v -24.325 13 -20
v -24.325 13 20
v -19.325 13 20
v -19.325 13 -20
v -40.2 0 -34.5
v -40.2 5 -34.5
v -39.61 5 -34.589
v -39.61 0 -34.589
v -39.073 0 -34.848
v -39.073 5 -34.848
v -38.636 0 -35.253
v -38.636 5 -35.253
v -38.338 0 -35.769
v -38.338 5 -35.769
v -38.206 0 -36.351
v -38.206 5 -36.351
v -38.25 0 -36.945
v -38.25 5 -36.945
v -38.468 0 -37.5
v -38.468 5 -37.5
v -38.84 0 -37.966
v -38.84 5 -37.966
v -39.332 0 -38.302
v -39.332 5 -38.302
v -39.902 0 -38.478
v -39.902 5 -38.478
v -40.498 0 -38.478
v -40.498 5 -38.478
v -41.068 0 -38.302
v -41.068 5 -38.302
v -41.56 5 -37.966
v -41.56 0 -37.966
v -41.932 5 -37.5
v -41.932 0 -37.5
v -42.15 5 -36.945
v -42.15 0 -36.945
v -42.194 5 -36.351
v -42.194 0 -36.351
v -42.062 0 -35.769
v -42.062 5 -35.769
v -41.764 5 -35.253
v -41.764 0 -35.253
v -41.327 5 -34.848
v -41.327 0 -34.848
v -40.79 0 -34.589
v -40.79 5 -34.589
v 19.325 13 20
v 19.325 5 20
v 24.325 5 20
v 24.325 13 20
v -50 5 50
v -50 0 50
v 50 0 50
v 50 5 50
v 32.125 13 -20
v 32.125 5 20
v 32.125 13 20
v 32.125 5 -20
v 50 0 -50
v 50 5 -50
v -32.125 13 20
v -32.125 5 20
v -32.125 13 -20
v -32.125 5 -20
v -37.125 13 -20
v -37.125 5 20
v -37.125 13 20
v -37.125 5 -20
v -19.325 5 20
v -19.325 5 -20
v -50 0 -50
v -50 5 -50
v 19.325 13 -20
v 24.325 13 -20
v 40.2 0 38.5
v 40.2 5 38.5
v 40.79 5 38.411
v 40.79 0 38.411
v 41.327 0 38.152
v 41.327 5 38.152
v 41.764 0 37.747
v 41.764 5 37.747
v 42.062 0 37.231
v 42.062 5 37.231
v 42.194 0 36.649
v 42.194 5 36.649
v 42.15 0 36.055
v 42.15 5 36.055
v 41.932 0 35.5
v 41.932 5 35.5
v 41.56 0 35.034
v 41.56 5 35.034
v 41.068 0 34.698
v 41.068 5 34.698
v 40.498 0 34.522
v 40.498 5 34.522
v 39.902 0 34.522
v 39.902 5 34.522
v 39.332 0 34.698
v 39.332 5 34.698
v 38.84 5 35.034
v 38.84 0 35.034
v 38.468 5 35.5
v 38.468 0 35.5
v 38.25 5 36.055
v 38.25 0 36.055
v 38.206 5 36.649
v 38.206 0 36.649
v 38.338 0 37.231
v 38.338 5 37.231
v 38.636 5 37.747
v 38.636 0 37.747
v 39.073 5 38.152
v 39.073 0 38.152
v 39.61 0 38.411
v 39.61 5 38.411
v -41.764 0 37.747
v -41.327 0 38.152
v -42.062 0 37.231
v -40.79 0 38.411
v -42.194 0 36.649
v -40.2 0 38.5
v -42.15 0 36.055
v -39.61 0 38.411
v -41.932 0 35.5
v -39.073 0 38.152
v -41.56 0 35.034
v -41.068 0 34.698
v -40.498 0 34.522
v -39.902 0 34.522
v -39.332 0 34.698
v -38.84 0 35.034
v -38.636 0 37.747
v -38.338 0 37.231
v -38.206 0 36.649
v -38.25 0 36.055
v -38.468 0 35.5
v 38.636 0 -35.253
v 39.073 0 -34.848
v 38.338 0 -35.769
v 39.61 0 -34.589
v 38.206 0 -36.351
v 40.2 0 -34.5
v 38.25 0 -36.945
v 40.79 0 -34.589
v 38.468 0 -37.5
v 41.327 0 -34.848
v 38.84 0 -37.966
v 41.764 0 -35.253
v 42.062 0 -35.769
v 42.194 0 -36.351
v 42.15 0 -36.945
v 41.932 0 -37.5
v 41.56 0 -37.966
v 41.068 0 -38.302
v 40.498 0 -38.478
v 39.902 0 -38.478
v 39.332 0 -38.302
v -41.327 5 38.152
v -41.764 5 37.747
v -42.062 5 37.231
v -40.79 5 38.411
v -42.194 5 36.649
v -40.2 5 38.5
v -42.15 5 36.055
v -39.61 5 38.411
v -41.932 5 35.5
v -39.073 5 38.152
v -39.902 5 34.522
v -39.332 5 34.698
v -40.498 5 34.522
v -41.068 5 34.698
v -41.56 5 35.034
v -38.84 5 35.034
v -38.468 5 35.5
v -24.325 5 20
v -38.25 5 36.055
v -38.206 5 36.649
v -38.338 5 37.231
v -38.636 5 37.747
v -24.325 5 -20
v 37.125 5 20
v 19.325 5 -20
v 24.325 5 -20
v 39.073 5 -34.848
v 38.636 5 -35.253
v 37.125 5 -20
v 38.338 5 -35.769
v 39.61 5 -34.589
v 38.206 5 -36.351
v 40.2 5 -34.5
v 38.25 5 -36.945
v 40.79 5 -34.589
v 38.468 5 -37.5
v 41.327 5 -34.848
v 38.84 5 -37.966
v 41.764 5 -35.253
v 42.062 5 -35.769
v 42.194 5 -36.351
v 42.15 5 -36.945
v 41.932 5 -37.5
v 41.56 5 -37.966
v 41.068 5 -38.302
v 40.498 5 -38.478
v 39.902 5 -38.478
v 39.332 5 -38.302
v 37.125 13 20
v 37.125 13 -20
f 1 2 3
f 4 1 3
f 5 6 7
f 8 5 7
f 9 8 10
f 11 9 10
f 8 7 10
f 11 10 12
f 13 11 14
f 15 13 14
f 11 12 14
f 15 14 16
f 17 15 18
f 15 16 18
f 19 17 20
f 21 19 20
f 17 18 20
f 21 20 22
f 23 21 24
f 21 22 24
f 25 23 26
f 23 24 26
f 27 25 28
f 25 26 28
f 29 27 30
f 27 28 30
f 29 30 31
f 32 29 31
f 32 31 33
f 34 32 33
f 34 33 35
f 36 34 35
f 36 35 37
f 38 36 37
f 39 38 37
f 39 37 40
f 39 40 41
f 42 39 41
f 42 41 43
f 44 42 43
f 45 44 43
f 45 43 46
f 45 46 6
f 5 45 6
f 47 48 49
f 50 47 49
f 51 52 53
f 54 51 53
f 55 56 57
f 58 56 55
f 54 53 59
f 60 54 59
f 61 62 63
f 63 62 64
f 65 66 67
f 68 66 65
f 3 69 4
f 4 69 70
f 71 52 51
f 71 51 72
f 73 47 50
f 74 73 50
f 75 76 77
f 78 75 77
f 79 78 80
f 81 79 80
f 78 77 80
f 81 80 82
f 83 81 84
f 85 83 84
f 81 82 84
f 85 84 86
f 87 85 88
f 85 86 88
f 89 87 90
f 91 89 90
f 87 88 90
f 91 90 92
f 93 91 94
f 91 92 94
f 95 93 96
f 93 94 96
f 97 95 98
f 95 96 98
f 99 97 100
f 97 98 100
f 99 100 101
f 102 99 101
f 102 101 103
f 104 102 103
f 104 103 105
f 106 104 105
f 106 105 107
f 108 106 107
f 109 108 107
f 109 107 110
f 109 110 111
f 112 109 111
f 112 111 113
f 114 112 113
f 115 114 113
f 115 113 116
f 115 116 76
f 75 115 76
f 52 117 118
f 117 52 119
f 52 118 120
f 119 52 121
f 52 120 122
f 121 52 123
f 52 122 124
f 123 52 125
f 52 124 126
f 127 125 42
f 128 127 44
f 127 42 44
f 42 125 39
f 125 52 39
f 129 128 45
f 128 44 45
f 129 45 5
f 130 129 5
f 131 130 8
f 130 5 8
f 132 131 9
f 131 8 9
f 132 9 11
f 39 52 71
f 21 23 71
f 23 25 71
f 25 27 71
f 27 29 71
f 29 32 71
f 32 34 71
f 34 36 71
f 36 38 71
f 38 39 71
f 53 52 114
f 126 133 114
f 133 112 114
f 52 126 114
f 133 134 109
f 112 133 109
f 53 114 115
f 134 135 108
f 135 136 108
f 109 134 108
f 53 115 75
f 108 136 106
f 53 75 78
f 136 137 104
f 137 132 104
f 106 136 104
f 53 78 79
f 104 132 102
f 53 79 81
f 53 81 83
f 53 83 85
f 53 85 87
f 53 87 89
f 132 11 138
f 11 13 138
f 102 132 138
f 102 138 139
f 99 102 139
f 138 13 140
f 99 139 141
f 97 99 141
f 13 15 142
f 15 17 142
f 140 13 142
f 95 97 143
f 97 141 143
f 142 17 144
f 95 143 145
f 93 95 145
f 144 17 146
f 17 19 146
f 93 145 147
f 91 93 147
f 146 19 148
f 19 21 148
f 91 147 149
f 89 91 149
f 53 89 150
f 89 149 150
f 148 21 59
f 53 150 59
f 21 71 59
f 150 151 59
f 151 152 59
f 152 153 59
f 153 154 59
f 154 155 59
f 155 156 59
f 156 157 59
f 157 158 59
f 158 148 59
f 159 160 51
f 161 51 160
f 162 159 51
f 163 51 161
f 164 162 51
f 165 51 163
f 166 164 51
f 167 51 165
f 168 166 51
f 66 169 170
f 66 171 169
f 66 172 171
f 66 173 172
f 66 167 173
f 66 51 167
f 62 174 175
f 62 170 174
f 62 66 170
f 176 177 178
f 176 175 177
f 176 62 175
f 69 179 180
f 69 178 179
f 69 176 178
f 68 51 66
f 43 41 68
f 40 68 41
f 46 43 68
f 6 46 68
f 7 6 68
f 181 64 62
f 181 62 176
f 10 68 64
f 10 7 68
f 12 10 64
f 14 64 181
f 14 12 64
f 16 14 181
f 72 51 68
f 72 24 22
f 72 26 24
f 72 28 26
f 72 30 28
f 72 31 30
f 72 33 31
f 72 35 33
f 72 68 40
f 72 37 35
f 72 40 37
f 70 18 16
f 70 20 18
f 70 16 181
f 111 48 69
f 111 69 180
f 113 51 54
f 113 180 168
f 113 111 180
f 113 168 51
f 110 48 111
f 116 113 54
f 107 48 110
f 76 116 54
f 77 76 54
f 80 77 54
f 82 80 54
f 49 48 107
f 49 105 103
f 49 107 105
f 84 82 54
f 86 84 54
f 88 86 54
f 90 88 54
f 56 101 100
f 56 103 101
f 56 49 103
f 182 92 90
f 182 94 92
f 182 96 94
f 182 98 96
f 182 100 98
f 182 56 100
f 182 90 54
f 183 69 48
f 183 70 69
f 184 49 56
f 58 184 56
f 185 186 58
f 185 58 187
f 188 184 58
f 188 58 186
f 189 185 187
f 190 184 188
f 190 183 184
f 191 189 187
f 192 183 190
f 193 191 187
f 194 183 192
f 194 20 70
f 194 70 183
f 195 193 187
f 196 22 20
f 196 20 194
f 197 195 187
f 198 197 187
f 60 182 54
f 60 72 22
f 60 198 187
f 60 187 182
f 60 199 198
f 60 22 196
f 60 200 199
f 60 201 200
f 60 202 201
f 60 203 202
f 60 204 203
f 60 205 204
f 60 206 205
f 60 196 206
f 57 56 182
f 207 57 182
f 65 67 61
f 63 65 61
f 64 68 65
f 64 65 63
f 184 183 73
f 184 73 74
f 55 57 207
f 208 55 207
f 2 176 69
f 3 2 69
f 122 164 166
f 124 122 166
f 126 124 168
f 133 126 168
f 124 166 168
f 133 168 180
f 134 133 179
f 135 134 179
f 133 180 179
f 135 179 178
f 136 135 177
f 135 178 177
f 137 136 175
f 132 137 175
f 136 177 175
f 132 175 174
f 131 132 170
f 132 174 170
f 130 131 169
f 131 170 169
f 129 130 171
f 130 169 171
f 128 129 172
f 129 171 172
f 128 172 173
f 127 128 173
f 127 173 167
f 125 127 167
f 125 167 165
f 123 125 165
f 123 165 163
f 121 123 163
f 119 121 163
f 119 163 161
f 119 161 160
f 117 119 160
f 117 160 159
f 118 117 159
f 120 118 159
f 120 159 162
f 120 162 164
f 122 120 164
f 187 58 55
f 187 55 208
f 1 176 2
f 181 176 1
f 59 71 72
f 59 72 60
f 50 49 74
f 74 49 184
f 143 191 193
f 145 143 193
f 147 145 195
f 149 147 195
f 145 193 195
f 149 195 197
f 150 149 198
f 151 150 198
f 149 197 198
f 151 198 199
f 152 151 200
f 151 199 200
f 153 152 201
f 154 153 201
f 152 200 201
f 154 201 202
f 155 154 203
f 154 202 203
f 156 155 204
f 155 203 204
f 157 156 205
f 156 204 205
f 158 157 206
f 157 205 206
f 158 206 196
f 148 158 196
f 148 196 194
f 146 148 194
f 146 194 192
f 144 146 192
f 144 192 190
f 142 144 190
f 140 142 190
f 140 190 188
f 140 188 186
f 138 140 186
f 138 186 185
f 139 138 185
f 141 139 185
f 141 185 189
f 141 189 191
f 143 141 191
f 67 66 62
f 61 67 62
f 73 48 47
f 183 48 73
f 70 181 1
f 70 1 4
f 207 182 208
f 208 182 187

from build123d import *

# Parameters (mm, degrees)
SKETCH1_W           = 100
SKETCH1_H           = 100
BOSS_EXTRUDE1_DEPTH = 5
SKETCH2_W           = 5
SKETCH2_H           = 40
BOSS_EXTRUDE2_DEPTH = 8
SKETCH4_R           = 2
CUT_EXTRUDE1_DEPTH  = 8


with BuildPart() as part:
    # Sketch1 → Boss-Extrude1 (new body)
    with BuildSketch(Plane(origin=(0, 0, 0), x_dir=(1, 0, 0), z_dir=(0, 1, 0))):
        Rectangle(SKETCH1_W, SKETCH1_H)
    extrude(amount=BOSS_EXTRUDE1_DEPTH)

    # Sketch2 → Boss-Extrude2 (add)
    with BuildSketch(Plane(origin=(0, 5, 0), x_dir=(1, 0, 0), z_dir=(0, 1, 0))):
        with Locations((21.825, 0)):
            Rectangle(SKETCH2_W, SKETCH2_H)
        with Locations((-34.625, 0)):
            Rectangle(SKETCH2_W, SKETCH2_H)
        with Locations((-21.825, 0)):
            Rectangle(SKETCH2_W, SKETCH2_H)
        with Locations((34.625, 0)):
            Rectangle(SKETCH2_W, SKETCH2_H)
    extrude(amount=BOSS_EXTRUDE2_DEPTH)

    # Sketch4 → Cut-Extrude1 (cut)
    with BuildSketch(Plane(origin=(0, 5, 0), x_dir=(1, 0, 0), z_dir=(0, 1, 0))):
        with Locations(Location((40.2, 36.5, 0), (0, 0, 270))):
            Circle(SKETCH4_R)
        with Locations(Location((40.2, -36.5, 0), (0, 0, 270))):
            Circle(SKETCH4_R)
        with Locations(Location((-40.2, -36.5, 0), (0, 0, 270))):
            Circle(SKETCH4_R)
        with Locations(Location((-40.2, 36.5, 0), (0, 0, 270))):
            Circle(SKETCH4_R)
    extrude(amount=-CUT_EXTRUDE1_DEPTH, mode=Mode.SUBTRACT)


solid = part.part
